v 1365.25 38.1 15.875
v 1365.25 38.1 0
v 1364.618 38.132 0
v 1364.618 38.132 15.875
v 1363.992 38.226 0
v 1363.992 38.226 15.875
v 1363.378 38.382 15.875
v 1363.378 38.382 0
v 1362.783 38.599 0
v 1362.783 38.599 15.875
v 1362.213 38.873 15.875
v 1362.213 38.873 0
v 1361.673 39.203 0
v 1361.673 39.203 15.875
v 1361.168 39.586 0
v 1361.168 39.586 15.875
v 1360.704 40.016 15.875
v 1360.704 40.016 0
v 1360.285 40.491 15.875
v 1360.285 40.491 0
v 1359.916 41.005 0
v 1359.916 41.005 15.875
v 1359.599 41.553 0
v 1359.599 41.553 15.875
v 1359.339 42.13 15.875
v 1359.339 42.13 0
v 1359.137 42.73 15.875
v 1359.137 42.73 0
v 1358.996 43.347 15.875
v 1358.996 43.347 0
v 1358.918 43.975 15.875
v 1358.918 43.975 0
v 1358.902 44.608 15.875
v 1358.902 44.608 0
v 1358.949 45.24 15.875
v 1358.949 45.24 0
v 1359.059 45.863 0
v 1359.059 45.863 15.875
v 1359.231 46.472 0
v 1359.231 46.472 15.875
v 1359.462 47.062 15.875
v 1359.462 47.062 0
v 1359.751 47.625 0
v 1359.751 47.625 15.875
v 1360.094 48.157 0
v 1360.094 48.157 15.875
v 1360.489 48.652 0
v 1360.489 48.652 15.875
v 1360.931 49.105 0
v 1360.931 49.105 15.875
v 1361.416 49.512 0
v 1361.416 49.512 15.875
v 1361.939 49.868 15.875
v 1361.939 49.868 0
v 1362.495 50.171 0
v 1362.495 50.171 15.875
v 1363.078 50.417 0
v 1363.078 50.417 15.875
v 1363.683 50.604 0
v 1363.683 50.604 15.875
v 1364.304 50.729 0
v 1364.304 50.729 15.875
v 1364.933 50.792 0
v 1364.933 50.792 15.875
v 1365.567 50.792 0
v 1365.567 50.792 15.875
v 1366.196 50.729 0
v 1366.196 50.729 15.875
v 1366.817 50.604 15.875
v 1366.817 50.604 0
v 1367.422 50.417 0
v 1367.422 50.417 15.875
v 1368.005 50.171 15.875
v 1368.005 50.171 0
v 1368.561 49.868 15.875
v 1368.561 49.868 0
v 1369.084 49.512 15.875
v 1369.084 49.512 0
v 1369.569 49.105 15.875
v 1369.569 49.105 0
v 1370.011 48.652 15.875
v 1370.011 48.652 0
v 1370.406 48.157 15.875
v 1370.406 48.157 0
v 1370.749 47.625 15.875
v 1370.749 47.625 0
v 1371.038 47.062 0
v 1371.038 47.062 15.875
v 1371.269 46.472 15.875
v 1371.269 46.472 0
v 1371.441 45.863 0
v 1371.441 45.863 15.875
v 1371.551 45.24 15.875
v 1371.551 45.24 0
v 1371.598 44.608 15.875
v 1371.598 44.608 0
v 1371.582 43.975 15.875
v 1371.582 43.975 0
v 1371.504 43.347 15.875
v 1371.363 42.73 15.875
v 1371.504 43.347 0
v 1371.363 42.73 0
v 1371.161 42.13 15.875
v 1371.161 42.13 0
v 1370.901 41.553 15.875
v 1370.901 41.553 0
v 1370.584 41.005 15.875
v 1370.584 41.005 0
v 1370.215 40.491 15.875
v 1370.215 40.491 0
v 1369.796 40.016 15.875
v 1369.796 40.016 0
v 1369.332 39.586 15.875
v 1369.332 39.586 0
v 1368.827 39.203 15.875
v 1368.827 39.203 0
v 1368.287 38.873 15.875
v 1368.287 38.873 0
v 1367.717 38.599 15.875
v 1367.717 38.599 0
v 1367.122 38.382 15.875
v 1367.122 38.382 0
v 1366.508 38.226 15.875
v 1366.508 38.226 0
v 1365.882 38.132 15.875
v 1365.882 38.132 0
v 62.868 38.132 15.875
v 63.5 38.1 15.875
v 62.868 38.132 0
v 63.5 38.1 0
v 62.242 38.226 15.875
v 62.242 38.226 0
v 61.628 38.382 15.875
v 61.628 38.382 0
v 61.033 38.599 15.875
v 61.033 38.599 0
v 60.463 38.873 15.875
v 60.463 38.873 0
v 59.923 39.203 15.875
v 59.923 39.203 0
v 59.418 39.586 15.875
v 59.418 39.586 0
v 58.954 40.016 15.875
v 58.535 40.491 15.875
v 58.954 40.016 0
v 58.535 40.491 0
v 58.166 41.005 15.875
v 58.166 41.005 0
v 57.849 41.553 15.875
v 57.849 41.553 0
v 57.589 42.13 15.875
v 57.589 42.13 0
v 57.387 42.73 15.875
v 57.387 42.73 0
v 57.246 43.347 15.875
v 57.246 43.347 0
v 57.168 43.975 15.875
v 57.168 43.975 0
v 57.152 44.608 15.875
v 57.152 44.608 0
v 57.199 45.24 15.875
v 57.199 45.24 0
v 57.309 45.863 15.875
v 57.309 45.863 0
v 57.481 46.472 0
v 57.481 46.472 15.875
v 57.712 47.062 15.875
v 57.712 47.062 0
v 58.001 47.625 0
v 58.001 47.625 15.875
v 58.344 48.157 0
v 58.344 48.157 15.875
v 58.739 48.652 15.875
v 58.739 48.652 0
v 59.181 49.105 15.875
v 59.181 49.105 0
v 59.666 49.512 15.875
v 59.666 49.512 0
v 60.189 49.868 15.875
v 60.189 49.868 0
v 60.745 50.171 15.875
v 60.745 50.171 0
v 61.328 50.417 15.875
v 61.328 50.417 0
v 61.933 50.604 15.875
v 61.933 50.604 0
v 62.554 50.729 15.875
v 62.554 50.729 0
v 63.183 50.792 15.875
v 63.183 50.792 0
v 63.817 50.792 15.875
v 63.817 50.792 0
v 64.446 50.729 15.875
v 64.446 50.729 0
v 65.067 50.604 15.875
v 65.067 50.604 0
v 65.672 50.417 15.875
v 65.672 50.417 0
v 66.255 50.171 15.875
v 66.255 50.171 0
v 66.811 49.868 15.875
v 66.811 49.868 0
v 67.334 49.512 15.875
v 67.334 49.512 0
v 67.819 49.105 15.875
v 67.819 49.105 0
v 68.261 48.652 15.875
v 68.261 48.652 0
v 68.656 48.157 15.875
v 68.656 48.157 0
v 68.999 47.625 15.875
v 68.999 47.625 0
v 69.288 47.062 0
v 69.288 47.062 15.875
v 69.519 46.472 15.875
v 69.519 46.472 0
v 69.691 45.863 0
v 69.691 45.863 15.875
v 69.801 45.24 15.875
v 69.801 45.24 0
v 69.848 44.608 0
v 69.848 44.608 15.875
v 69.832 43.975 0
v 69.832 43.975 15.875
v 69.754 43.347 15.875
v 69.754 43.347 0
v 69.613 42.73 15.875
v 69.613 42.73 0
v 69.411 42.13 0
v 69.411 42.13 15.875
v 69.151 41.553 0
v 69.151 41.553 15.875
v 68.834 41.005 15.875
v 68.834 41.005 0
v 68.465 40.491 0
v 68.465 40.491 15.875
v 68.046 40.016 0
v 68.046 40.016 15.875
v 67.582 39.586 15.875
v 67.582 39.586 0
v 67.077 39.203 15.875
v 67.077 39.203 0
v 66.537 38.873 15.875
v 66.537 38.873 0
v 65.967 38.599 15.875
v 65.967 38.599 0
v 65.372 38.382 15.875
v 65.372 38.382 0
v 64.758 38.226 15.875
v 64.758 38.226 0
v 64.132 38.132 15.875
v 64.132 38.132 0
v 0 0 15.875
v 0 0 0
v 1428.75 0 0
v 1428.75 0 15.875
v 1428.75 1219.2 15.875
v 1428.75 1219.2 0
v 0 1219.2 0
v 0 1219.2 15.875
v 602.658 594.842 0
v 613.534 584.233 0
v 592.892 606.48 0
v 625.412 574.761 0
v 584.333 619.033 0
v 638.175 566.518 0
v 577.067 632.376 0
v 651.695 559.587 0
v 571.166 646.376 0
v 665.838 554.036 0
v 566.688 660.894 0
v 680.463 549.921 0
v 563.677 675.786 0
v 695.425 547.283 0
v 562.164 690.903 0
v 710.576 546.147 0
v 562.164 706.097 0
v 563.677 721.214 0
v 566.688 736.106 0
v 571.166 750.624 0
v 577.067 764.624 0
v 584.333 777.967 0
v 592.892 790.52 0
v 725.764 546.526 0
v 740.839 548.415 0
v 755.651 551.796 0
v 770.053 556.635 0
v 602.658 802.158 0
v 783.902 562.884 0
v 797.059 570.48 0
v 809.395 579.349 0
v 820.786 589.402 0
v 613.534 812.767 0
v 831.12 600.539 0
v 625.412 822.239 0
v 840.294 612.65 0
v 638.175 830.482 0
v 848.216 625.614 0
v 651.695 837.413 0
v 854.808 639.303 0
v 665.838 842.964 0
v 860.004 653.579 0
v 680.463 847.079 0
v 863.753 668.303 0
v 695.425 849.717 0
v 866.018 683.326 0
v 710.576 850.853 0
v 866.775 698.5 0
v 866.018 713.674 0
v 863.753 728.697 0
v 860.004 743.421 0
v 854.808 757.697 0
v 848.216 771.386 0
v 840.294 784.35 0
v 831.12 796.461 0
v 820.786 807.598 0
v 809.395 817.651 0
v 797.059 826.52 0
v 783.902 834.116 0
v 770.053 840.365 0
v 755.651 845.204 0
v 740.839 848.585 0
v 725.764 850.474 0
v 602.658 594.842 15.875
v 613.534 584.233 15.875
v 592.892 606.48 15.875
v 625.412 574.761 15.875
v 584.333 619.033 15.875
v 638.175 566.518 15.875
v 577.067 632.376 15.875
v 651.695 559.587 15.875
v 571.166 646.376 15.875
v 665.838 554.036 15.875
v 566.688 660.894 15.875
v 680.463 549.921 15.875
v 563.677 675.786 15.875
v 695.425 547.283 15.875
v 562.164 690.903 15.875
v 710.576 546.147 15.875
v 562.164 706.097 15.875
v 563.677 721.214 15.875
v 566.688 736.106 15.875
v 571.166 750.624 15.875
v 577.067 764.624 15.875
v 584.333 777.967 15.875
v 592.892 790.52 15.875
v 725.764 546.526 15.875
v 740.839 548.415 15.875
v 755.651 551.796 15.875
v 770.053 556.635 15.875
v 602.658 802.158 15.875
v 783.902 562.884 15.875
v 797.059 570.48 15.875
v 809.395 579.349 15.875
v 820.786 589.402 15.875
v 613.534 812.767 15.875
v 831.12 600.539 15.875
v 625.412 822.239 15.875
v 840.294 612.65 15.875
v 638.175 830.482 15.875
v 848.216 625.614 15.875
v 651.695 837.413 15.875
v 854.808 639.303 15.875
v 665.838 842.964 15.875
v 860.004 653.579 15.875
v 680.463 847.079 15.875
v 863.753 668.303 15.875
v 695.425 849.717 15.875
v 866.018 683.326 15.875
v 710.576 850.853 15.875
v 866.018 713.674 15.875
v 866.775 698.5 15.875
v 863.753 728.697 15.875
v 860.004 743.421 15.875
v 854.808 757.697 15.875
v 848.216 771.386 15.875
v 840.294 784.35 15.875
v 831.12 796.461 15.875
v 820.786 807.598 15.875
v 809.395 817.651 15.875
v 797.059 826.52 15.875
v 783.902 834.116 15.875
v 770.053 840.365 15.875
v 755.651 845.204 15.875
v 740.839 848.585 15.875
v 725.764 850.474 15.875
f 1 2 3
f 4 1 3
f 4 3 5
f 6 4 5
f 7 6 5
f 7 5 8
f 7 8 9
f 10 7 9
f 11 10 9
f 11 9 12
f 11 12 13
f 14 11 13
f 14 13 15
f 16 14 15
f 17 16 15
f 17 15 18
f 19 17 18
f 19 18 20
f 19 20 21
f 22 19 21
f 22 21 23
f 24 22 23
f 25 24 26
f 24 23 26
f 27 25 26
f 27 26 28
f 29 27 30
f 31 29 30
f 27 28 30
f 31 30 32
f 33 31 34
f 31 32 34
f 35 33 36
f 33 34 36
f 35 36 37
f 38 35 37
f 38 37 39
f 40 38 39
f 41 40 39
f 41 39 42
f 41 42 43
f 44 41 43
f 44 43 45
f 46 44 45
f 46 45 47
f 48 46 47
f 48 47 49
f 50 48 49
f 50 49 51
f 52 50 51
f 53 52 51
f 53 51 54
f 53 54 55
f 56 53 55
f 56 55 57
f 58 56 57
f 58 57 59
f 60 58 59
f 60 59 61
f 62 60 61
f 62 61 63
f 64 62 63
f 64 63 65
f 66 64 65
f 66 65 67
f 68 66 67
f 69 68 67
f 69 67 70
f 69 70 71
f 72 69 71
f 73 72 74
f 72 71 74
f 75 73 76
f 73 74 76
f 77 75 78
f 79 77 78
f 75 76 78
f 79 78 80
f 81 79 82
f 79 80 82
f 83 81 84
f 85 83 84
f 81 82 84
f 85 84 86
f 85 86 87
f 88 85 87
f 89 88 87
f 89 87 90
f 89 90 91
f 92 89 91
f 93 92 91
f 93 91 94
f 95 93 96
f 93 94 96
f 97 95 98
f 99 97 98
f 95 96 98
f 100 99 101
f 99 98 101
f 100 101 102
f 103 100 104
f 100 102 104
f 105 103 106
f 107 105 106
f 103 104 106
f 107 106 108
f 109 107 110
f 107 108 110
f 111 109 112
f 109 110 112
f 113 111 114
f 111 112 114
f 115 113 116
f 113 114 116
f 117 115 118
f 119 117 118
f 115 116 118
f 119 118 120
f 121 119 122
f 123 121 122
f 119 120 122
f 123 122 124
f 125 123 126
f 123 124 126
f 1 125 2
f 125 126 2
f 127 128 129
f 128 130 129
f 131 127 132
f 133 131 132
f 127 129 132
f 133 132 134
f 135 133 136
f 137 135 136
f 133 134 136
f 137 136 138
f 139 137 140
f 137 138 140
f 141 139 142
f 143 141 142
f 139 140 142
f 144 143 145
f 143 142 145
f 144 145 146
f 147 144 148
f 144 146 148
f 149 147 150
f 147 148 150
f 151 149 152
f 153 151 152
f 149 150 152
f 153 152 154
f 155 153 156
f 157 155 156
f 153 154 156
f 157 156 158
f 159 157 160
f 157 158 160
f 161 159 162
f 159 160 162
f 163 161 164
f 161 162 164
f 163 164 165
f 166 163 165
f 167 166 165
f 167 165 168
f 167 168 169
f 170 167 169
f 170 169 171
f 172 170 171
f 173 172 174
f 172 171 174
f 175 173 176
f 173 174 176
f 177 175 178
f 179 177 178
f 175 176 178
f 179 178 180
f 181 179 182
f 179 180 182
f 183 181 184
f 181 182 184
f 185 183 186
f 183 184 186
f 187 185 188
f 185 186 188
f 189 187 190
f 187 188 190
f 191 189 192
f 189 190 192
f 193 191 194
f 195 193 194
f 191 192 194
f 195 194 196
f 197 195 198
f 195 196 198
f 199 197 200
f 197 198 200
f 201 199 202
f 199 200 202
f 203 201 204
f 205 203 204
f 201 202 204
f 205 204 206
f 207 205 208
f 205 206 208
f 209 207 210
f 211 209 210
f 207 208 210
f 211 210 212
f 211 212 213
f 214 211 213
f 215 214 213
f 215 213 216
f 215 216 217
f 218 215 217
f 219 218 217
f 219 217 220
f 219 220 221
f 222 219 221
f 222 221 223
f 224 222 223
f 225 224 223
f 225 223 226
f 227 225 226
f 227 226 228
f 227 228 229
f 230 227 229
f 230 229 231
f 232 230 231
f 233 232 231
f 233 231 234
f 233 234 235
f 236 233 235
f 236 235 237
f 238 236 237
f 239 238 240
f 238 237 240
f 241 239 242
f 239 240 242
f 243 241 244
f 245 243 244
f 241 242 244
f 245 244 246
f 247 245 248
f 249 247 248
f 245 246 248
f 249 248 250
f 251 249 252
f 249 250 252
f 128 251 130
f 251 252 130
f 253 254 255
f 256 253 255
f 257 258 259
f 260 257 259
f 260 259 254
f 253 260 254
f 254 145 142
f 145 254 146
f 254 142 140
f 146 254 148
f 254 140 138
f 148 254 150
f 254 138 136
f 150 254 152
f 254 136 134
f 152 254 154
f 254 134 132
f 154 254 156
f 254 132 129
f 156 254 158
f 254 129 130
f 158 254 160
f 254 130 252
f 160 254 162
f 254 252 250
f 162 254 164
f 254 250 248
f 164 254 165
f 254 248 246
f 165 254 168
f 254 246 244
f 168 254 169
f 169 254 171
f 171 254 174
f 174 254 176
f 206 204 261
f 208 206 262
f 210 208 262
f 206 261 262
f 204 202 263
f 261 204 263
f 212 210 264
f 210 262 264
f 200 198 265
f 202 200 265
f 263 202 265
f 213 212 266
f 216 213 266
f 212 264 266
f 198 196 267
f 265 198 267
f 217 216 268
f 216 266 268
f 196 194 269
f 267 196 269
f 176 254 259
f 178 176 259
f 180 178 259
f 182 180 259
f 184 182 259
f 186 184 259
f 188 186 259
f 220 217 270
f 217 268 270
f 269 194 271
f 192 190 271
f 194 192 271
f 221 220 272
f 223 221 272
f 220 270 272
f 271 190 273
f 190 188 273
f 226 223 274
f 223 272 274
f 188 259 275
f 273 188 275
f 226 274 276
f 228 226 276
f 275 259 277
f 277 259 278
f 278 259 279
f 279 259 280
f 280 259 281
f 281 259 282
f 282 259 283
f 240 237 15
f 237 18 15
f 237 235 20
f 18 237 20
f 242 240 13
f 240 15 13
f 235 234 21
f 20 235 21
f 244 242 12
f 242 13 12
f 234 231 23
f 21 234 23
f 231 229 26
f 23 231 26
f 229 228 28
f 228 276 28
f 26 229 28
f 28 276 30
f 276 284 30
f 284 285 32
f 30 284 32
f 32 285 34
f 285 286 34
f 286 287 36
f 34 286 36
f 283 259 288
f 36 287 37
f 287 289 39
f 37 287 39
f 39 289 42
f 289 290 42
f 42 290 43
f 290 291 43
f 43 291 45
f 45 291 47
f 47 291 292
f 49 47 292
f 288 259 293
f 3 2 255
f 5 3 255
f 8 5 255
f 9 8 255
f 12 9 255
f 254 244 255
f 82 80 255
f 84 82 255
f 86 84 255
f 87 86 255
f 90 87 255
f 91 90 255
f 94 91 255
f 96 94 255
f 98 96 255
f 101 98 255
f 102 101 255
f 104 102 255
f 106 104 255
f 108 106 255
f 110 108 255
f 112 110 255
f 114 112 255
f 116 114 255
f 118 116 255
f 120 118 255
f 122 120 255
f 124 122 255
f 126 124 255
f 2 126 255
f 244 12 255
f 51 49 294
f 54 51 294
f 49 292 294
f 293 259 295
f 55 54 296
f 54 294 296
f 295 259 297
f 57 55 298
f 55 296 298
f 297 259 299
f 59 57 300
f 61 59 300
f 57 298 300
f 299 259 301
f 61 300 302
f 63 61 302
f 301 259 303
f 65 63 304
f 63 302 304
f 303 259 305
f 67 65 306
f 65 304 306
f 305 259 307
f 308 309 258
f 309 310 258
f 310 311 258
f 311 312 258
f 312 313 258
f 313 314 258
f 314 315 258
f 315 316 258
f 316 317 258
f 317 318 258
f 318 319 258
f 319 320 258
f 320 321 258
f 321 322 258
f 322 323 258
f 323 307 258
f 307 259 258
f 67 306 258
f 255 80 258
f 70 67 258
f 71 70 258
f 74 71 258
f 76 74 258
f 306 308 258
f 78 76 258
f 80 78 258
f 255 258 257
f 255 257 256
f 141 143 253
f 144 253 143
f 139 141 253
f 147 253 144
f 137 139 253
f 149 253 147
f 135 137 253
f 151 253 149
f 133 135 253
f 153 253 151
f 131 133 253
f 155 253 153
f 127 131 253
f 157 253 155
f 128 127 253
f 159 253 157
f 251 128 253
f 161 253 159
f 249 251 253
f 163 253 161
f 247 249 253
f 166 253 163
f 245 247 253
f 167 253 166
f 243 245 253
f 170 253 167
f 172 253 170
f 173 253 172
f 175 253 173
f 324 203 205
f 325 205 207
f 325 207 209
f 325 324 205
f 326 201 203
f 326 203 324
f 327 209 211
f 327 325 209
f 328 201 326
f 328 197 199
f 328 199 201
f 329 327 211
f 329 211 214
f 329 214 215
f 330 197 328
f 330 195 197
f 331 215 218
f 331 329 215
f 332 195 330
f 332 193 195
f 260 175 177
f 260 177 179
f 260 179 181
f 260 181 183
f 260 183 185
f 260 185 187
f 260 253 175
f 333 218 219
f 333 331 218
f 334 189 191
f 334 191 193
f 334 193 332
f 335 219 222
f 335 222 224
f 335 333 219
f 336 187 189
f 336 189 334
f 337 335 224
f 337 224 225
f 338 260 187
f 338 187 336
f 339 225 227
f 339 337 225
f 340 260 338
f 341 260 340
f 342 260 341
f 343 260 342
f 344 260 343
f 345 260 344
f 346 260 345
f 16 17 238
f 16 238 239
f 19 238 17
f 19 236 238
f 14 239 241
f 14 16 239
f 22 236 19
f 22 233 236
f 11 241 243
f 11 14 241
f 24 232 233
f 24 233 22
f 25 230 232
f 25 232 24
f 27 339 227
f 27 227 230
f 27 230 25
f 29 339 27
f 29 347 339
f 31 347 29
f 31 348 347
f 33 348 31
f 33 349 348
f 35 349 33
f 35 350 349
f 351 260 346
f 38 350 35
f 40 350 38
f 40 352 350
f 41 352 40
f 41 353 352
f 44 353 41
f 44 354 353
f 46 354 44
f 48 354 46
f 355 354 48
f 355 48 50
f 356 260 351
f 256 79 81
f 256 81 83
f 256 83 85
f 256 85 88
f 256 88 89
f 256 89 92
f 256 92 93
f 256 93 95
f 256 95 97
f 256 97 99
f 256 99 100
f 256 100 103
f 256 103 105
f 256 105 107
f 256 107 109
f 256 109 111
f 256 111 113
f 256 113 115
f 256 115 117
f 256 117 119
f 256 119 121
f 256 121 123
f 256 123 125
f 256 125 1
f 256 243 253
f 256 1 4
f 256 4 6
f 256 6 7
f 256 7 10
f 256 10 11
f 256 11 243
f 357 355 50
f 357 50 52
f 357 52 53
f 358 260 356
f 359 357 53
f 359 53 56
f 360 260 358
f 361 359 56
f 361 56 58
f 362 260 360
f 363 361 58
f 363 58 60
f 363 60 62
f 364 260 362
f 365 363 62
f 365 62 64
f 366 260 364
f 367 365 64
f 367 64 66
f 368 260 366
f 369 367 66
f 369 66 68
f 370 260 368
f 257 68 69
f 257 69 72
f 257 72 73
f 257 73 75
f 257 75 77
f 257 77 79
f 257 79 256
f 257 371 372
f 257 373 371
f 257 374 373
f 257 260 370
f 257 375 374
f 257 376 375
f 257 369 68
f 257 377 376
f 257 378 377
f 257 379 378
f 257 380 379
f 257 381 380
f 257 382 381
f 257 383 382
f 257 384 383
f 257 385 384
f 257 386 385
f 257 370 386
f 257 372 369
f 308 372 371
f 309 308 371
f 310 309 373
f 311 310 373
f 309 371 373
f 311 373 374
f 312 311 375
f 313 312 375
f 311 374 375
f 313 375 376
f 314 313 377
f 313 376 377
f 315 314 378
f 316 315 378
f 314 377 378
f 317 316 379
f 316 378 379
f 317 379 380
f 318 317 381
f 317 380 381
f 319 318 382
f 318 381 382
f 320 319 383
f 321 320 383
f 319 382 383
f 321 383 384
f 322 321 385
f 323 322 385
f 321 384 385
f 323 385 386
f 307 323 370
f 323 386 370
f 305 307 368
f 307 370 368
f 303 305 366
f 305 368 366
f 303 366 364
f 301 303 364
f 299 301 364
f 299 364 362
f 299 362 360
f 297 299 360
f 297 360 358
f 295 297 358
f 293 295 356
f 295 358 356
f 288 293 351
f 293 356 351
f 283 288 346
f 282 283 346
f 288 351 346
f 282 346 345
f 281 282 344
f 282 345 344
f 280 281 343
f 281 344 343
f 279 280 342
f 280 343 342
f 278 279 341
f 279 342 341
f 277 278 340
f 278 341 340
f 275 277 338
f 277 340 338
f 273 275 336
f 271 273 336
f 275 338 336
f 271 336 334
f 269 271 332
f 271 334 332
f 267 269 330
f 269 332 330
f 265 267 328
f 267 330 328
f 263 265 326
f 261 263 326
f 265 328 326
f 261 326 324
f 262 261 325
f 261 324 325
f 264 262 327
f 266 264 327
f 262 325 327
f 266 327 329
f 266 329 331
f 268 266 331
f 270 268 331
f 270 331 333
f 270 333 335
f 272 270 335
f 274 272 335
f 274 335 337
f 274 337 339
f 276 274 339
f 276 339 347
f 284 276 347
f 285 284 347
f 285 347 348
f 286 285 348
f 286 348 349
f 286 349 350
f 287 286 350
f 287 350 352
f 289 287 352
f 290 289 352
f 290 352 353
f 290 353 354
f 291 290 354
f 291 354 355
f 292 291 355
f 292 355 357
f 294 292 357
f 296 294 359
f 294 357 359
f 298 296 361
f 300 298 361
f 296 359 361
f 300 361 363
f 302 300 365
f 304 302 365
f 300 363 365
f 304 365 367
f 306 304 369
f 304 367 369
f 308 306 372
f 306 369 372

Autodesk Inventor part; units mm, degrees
ref_plane "YZ Plane" through (0, 0, 0) normal (1, 0, 0) x (0, 1, 0)
ref_plane "XZ Plane" through (0, 0, 0) normal (0, 1, 0) x (-1, 0, 0)
ref_plane "XY Plane" through (0, 0, 0) normal (0, 0, 1) x (1, 0, 0)
sketch "Sketch1" plane through (0, 0, 0) normal (0, 0, 1) x (1, 0, 0)
  line L0 (0, 0) -> (1428.75, 0)
  line L1 (1428.75, 1219.2) -> (0, 1219.2)
  line L2 (0, 1219.2) -> (0, 0)
  line L3 (0, 0) -> (1428.75, 0)
  line L4 (1428.75, 1219.2) -> (0, 1219.2)
  line L5 (0, 1219.2) -> (0, 0)
  line L6 (0, 1219.2) -> (1428.75, 1219.2)
  line L7 (1428.75, 1219.2) -> (1428.75, 0)
extrude "Extrusion1" add sketch "Sketch1" along normal blind 15.875
sketch "Sketch2" plane through (0, 0, 15.875) normal (0, 0, 1) x (1, 0, 0)
  circle A0 centre (714.375, 698.5) radius 152.4
extrude "Extrusion2" cut sketch "Sketch2" against normal blind 15.875
sketch "Sketch3" plane through (0, 0, 15.875) normal (0, 0, 1) x (1, 0, 0)
  line L0 (1428.75, 0) -> (1428.75, 1219.2) projected
  line L1 (0, 0) -> (63.5, 0)
  point P0 (1365.25, 44.45)
  point P1 (63.5, 44.45)
hole "Hole1" at (1365.25, 44.45, 15.875) at (63.5, 44.45, 15.875) direction (0, 0, -1) diameter 12.7 end through all
properties part number "56.25x48 Gyp"
